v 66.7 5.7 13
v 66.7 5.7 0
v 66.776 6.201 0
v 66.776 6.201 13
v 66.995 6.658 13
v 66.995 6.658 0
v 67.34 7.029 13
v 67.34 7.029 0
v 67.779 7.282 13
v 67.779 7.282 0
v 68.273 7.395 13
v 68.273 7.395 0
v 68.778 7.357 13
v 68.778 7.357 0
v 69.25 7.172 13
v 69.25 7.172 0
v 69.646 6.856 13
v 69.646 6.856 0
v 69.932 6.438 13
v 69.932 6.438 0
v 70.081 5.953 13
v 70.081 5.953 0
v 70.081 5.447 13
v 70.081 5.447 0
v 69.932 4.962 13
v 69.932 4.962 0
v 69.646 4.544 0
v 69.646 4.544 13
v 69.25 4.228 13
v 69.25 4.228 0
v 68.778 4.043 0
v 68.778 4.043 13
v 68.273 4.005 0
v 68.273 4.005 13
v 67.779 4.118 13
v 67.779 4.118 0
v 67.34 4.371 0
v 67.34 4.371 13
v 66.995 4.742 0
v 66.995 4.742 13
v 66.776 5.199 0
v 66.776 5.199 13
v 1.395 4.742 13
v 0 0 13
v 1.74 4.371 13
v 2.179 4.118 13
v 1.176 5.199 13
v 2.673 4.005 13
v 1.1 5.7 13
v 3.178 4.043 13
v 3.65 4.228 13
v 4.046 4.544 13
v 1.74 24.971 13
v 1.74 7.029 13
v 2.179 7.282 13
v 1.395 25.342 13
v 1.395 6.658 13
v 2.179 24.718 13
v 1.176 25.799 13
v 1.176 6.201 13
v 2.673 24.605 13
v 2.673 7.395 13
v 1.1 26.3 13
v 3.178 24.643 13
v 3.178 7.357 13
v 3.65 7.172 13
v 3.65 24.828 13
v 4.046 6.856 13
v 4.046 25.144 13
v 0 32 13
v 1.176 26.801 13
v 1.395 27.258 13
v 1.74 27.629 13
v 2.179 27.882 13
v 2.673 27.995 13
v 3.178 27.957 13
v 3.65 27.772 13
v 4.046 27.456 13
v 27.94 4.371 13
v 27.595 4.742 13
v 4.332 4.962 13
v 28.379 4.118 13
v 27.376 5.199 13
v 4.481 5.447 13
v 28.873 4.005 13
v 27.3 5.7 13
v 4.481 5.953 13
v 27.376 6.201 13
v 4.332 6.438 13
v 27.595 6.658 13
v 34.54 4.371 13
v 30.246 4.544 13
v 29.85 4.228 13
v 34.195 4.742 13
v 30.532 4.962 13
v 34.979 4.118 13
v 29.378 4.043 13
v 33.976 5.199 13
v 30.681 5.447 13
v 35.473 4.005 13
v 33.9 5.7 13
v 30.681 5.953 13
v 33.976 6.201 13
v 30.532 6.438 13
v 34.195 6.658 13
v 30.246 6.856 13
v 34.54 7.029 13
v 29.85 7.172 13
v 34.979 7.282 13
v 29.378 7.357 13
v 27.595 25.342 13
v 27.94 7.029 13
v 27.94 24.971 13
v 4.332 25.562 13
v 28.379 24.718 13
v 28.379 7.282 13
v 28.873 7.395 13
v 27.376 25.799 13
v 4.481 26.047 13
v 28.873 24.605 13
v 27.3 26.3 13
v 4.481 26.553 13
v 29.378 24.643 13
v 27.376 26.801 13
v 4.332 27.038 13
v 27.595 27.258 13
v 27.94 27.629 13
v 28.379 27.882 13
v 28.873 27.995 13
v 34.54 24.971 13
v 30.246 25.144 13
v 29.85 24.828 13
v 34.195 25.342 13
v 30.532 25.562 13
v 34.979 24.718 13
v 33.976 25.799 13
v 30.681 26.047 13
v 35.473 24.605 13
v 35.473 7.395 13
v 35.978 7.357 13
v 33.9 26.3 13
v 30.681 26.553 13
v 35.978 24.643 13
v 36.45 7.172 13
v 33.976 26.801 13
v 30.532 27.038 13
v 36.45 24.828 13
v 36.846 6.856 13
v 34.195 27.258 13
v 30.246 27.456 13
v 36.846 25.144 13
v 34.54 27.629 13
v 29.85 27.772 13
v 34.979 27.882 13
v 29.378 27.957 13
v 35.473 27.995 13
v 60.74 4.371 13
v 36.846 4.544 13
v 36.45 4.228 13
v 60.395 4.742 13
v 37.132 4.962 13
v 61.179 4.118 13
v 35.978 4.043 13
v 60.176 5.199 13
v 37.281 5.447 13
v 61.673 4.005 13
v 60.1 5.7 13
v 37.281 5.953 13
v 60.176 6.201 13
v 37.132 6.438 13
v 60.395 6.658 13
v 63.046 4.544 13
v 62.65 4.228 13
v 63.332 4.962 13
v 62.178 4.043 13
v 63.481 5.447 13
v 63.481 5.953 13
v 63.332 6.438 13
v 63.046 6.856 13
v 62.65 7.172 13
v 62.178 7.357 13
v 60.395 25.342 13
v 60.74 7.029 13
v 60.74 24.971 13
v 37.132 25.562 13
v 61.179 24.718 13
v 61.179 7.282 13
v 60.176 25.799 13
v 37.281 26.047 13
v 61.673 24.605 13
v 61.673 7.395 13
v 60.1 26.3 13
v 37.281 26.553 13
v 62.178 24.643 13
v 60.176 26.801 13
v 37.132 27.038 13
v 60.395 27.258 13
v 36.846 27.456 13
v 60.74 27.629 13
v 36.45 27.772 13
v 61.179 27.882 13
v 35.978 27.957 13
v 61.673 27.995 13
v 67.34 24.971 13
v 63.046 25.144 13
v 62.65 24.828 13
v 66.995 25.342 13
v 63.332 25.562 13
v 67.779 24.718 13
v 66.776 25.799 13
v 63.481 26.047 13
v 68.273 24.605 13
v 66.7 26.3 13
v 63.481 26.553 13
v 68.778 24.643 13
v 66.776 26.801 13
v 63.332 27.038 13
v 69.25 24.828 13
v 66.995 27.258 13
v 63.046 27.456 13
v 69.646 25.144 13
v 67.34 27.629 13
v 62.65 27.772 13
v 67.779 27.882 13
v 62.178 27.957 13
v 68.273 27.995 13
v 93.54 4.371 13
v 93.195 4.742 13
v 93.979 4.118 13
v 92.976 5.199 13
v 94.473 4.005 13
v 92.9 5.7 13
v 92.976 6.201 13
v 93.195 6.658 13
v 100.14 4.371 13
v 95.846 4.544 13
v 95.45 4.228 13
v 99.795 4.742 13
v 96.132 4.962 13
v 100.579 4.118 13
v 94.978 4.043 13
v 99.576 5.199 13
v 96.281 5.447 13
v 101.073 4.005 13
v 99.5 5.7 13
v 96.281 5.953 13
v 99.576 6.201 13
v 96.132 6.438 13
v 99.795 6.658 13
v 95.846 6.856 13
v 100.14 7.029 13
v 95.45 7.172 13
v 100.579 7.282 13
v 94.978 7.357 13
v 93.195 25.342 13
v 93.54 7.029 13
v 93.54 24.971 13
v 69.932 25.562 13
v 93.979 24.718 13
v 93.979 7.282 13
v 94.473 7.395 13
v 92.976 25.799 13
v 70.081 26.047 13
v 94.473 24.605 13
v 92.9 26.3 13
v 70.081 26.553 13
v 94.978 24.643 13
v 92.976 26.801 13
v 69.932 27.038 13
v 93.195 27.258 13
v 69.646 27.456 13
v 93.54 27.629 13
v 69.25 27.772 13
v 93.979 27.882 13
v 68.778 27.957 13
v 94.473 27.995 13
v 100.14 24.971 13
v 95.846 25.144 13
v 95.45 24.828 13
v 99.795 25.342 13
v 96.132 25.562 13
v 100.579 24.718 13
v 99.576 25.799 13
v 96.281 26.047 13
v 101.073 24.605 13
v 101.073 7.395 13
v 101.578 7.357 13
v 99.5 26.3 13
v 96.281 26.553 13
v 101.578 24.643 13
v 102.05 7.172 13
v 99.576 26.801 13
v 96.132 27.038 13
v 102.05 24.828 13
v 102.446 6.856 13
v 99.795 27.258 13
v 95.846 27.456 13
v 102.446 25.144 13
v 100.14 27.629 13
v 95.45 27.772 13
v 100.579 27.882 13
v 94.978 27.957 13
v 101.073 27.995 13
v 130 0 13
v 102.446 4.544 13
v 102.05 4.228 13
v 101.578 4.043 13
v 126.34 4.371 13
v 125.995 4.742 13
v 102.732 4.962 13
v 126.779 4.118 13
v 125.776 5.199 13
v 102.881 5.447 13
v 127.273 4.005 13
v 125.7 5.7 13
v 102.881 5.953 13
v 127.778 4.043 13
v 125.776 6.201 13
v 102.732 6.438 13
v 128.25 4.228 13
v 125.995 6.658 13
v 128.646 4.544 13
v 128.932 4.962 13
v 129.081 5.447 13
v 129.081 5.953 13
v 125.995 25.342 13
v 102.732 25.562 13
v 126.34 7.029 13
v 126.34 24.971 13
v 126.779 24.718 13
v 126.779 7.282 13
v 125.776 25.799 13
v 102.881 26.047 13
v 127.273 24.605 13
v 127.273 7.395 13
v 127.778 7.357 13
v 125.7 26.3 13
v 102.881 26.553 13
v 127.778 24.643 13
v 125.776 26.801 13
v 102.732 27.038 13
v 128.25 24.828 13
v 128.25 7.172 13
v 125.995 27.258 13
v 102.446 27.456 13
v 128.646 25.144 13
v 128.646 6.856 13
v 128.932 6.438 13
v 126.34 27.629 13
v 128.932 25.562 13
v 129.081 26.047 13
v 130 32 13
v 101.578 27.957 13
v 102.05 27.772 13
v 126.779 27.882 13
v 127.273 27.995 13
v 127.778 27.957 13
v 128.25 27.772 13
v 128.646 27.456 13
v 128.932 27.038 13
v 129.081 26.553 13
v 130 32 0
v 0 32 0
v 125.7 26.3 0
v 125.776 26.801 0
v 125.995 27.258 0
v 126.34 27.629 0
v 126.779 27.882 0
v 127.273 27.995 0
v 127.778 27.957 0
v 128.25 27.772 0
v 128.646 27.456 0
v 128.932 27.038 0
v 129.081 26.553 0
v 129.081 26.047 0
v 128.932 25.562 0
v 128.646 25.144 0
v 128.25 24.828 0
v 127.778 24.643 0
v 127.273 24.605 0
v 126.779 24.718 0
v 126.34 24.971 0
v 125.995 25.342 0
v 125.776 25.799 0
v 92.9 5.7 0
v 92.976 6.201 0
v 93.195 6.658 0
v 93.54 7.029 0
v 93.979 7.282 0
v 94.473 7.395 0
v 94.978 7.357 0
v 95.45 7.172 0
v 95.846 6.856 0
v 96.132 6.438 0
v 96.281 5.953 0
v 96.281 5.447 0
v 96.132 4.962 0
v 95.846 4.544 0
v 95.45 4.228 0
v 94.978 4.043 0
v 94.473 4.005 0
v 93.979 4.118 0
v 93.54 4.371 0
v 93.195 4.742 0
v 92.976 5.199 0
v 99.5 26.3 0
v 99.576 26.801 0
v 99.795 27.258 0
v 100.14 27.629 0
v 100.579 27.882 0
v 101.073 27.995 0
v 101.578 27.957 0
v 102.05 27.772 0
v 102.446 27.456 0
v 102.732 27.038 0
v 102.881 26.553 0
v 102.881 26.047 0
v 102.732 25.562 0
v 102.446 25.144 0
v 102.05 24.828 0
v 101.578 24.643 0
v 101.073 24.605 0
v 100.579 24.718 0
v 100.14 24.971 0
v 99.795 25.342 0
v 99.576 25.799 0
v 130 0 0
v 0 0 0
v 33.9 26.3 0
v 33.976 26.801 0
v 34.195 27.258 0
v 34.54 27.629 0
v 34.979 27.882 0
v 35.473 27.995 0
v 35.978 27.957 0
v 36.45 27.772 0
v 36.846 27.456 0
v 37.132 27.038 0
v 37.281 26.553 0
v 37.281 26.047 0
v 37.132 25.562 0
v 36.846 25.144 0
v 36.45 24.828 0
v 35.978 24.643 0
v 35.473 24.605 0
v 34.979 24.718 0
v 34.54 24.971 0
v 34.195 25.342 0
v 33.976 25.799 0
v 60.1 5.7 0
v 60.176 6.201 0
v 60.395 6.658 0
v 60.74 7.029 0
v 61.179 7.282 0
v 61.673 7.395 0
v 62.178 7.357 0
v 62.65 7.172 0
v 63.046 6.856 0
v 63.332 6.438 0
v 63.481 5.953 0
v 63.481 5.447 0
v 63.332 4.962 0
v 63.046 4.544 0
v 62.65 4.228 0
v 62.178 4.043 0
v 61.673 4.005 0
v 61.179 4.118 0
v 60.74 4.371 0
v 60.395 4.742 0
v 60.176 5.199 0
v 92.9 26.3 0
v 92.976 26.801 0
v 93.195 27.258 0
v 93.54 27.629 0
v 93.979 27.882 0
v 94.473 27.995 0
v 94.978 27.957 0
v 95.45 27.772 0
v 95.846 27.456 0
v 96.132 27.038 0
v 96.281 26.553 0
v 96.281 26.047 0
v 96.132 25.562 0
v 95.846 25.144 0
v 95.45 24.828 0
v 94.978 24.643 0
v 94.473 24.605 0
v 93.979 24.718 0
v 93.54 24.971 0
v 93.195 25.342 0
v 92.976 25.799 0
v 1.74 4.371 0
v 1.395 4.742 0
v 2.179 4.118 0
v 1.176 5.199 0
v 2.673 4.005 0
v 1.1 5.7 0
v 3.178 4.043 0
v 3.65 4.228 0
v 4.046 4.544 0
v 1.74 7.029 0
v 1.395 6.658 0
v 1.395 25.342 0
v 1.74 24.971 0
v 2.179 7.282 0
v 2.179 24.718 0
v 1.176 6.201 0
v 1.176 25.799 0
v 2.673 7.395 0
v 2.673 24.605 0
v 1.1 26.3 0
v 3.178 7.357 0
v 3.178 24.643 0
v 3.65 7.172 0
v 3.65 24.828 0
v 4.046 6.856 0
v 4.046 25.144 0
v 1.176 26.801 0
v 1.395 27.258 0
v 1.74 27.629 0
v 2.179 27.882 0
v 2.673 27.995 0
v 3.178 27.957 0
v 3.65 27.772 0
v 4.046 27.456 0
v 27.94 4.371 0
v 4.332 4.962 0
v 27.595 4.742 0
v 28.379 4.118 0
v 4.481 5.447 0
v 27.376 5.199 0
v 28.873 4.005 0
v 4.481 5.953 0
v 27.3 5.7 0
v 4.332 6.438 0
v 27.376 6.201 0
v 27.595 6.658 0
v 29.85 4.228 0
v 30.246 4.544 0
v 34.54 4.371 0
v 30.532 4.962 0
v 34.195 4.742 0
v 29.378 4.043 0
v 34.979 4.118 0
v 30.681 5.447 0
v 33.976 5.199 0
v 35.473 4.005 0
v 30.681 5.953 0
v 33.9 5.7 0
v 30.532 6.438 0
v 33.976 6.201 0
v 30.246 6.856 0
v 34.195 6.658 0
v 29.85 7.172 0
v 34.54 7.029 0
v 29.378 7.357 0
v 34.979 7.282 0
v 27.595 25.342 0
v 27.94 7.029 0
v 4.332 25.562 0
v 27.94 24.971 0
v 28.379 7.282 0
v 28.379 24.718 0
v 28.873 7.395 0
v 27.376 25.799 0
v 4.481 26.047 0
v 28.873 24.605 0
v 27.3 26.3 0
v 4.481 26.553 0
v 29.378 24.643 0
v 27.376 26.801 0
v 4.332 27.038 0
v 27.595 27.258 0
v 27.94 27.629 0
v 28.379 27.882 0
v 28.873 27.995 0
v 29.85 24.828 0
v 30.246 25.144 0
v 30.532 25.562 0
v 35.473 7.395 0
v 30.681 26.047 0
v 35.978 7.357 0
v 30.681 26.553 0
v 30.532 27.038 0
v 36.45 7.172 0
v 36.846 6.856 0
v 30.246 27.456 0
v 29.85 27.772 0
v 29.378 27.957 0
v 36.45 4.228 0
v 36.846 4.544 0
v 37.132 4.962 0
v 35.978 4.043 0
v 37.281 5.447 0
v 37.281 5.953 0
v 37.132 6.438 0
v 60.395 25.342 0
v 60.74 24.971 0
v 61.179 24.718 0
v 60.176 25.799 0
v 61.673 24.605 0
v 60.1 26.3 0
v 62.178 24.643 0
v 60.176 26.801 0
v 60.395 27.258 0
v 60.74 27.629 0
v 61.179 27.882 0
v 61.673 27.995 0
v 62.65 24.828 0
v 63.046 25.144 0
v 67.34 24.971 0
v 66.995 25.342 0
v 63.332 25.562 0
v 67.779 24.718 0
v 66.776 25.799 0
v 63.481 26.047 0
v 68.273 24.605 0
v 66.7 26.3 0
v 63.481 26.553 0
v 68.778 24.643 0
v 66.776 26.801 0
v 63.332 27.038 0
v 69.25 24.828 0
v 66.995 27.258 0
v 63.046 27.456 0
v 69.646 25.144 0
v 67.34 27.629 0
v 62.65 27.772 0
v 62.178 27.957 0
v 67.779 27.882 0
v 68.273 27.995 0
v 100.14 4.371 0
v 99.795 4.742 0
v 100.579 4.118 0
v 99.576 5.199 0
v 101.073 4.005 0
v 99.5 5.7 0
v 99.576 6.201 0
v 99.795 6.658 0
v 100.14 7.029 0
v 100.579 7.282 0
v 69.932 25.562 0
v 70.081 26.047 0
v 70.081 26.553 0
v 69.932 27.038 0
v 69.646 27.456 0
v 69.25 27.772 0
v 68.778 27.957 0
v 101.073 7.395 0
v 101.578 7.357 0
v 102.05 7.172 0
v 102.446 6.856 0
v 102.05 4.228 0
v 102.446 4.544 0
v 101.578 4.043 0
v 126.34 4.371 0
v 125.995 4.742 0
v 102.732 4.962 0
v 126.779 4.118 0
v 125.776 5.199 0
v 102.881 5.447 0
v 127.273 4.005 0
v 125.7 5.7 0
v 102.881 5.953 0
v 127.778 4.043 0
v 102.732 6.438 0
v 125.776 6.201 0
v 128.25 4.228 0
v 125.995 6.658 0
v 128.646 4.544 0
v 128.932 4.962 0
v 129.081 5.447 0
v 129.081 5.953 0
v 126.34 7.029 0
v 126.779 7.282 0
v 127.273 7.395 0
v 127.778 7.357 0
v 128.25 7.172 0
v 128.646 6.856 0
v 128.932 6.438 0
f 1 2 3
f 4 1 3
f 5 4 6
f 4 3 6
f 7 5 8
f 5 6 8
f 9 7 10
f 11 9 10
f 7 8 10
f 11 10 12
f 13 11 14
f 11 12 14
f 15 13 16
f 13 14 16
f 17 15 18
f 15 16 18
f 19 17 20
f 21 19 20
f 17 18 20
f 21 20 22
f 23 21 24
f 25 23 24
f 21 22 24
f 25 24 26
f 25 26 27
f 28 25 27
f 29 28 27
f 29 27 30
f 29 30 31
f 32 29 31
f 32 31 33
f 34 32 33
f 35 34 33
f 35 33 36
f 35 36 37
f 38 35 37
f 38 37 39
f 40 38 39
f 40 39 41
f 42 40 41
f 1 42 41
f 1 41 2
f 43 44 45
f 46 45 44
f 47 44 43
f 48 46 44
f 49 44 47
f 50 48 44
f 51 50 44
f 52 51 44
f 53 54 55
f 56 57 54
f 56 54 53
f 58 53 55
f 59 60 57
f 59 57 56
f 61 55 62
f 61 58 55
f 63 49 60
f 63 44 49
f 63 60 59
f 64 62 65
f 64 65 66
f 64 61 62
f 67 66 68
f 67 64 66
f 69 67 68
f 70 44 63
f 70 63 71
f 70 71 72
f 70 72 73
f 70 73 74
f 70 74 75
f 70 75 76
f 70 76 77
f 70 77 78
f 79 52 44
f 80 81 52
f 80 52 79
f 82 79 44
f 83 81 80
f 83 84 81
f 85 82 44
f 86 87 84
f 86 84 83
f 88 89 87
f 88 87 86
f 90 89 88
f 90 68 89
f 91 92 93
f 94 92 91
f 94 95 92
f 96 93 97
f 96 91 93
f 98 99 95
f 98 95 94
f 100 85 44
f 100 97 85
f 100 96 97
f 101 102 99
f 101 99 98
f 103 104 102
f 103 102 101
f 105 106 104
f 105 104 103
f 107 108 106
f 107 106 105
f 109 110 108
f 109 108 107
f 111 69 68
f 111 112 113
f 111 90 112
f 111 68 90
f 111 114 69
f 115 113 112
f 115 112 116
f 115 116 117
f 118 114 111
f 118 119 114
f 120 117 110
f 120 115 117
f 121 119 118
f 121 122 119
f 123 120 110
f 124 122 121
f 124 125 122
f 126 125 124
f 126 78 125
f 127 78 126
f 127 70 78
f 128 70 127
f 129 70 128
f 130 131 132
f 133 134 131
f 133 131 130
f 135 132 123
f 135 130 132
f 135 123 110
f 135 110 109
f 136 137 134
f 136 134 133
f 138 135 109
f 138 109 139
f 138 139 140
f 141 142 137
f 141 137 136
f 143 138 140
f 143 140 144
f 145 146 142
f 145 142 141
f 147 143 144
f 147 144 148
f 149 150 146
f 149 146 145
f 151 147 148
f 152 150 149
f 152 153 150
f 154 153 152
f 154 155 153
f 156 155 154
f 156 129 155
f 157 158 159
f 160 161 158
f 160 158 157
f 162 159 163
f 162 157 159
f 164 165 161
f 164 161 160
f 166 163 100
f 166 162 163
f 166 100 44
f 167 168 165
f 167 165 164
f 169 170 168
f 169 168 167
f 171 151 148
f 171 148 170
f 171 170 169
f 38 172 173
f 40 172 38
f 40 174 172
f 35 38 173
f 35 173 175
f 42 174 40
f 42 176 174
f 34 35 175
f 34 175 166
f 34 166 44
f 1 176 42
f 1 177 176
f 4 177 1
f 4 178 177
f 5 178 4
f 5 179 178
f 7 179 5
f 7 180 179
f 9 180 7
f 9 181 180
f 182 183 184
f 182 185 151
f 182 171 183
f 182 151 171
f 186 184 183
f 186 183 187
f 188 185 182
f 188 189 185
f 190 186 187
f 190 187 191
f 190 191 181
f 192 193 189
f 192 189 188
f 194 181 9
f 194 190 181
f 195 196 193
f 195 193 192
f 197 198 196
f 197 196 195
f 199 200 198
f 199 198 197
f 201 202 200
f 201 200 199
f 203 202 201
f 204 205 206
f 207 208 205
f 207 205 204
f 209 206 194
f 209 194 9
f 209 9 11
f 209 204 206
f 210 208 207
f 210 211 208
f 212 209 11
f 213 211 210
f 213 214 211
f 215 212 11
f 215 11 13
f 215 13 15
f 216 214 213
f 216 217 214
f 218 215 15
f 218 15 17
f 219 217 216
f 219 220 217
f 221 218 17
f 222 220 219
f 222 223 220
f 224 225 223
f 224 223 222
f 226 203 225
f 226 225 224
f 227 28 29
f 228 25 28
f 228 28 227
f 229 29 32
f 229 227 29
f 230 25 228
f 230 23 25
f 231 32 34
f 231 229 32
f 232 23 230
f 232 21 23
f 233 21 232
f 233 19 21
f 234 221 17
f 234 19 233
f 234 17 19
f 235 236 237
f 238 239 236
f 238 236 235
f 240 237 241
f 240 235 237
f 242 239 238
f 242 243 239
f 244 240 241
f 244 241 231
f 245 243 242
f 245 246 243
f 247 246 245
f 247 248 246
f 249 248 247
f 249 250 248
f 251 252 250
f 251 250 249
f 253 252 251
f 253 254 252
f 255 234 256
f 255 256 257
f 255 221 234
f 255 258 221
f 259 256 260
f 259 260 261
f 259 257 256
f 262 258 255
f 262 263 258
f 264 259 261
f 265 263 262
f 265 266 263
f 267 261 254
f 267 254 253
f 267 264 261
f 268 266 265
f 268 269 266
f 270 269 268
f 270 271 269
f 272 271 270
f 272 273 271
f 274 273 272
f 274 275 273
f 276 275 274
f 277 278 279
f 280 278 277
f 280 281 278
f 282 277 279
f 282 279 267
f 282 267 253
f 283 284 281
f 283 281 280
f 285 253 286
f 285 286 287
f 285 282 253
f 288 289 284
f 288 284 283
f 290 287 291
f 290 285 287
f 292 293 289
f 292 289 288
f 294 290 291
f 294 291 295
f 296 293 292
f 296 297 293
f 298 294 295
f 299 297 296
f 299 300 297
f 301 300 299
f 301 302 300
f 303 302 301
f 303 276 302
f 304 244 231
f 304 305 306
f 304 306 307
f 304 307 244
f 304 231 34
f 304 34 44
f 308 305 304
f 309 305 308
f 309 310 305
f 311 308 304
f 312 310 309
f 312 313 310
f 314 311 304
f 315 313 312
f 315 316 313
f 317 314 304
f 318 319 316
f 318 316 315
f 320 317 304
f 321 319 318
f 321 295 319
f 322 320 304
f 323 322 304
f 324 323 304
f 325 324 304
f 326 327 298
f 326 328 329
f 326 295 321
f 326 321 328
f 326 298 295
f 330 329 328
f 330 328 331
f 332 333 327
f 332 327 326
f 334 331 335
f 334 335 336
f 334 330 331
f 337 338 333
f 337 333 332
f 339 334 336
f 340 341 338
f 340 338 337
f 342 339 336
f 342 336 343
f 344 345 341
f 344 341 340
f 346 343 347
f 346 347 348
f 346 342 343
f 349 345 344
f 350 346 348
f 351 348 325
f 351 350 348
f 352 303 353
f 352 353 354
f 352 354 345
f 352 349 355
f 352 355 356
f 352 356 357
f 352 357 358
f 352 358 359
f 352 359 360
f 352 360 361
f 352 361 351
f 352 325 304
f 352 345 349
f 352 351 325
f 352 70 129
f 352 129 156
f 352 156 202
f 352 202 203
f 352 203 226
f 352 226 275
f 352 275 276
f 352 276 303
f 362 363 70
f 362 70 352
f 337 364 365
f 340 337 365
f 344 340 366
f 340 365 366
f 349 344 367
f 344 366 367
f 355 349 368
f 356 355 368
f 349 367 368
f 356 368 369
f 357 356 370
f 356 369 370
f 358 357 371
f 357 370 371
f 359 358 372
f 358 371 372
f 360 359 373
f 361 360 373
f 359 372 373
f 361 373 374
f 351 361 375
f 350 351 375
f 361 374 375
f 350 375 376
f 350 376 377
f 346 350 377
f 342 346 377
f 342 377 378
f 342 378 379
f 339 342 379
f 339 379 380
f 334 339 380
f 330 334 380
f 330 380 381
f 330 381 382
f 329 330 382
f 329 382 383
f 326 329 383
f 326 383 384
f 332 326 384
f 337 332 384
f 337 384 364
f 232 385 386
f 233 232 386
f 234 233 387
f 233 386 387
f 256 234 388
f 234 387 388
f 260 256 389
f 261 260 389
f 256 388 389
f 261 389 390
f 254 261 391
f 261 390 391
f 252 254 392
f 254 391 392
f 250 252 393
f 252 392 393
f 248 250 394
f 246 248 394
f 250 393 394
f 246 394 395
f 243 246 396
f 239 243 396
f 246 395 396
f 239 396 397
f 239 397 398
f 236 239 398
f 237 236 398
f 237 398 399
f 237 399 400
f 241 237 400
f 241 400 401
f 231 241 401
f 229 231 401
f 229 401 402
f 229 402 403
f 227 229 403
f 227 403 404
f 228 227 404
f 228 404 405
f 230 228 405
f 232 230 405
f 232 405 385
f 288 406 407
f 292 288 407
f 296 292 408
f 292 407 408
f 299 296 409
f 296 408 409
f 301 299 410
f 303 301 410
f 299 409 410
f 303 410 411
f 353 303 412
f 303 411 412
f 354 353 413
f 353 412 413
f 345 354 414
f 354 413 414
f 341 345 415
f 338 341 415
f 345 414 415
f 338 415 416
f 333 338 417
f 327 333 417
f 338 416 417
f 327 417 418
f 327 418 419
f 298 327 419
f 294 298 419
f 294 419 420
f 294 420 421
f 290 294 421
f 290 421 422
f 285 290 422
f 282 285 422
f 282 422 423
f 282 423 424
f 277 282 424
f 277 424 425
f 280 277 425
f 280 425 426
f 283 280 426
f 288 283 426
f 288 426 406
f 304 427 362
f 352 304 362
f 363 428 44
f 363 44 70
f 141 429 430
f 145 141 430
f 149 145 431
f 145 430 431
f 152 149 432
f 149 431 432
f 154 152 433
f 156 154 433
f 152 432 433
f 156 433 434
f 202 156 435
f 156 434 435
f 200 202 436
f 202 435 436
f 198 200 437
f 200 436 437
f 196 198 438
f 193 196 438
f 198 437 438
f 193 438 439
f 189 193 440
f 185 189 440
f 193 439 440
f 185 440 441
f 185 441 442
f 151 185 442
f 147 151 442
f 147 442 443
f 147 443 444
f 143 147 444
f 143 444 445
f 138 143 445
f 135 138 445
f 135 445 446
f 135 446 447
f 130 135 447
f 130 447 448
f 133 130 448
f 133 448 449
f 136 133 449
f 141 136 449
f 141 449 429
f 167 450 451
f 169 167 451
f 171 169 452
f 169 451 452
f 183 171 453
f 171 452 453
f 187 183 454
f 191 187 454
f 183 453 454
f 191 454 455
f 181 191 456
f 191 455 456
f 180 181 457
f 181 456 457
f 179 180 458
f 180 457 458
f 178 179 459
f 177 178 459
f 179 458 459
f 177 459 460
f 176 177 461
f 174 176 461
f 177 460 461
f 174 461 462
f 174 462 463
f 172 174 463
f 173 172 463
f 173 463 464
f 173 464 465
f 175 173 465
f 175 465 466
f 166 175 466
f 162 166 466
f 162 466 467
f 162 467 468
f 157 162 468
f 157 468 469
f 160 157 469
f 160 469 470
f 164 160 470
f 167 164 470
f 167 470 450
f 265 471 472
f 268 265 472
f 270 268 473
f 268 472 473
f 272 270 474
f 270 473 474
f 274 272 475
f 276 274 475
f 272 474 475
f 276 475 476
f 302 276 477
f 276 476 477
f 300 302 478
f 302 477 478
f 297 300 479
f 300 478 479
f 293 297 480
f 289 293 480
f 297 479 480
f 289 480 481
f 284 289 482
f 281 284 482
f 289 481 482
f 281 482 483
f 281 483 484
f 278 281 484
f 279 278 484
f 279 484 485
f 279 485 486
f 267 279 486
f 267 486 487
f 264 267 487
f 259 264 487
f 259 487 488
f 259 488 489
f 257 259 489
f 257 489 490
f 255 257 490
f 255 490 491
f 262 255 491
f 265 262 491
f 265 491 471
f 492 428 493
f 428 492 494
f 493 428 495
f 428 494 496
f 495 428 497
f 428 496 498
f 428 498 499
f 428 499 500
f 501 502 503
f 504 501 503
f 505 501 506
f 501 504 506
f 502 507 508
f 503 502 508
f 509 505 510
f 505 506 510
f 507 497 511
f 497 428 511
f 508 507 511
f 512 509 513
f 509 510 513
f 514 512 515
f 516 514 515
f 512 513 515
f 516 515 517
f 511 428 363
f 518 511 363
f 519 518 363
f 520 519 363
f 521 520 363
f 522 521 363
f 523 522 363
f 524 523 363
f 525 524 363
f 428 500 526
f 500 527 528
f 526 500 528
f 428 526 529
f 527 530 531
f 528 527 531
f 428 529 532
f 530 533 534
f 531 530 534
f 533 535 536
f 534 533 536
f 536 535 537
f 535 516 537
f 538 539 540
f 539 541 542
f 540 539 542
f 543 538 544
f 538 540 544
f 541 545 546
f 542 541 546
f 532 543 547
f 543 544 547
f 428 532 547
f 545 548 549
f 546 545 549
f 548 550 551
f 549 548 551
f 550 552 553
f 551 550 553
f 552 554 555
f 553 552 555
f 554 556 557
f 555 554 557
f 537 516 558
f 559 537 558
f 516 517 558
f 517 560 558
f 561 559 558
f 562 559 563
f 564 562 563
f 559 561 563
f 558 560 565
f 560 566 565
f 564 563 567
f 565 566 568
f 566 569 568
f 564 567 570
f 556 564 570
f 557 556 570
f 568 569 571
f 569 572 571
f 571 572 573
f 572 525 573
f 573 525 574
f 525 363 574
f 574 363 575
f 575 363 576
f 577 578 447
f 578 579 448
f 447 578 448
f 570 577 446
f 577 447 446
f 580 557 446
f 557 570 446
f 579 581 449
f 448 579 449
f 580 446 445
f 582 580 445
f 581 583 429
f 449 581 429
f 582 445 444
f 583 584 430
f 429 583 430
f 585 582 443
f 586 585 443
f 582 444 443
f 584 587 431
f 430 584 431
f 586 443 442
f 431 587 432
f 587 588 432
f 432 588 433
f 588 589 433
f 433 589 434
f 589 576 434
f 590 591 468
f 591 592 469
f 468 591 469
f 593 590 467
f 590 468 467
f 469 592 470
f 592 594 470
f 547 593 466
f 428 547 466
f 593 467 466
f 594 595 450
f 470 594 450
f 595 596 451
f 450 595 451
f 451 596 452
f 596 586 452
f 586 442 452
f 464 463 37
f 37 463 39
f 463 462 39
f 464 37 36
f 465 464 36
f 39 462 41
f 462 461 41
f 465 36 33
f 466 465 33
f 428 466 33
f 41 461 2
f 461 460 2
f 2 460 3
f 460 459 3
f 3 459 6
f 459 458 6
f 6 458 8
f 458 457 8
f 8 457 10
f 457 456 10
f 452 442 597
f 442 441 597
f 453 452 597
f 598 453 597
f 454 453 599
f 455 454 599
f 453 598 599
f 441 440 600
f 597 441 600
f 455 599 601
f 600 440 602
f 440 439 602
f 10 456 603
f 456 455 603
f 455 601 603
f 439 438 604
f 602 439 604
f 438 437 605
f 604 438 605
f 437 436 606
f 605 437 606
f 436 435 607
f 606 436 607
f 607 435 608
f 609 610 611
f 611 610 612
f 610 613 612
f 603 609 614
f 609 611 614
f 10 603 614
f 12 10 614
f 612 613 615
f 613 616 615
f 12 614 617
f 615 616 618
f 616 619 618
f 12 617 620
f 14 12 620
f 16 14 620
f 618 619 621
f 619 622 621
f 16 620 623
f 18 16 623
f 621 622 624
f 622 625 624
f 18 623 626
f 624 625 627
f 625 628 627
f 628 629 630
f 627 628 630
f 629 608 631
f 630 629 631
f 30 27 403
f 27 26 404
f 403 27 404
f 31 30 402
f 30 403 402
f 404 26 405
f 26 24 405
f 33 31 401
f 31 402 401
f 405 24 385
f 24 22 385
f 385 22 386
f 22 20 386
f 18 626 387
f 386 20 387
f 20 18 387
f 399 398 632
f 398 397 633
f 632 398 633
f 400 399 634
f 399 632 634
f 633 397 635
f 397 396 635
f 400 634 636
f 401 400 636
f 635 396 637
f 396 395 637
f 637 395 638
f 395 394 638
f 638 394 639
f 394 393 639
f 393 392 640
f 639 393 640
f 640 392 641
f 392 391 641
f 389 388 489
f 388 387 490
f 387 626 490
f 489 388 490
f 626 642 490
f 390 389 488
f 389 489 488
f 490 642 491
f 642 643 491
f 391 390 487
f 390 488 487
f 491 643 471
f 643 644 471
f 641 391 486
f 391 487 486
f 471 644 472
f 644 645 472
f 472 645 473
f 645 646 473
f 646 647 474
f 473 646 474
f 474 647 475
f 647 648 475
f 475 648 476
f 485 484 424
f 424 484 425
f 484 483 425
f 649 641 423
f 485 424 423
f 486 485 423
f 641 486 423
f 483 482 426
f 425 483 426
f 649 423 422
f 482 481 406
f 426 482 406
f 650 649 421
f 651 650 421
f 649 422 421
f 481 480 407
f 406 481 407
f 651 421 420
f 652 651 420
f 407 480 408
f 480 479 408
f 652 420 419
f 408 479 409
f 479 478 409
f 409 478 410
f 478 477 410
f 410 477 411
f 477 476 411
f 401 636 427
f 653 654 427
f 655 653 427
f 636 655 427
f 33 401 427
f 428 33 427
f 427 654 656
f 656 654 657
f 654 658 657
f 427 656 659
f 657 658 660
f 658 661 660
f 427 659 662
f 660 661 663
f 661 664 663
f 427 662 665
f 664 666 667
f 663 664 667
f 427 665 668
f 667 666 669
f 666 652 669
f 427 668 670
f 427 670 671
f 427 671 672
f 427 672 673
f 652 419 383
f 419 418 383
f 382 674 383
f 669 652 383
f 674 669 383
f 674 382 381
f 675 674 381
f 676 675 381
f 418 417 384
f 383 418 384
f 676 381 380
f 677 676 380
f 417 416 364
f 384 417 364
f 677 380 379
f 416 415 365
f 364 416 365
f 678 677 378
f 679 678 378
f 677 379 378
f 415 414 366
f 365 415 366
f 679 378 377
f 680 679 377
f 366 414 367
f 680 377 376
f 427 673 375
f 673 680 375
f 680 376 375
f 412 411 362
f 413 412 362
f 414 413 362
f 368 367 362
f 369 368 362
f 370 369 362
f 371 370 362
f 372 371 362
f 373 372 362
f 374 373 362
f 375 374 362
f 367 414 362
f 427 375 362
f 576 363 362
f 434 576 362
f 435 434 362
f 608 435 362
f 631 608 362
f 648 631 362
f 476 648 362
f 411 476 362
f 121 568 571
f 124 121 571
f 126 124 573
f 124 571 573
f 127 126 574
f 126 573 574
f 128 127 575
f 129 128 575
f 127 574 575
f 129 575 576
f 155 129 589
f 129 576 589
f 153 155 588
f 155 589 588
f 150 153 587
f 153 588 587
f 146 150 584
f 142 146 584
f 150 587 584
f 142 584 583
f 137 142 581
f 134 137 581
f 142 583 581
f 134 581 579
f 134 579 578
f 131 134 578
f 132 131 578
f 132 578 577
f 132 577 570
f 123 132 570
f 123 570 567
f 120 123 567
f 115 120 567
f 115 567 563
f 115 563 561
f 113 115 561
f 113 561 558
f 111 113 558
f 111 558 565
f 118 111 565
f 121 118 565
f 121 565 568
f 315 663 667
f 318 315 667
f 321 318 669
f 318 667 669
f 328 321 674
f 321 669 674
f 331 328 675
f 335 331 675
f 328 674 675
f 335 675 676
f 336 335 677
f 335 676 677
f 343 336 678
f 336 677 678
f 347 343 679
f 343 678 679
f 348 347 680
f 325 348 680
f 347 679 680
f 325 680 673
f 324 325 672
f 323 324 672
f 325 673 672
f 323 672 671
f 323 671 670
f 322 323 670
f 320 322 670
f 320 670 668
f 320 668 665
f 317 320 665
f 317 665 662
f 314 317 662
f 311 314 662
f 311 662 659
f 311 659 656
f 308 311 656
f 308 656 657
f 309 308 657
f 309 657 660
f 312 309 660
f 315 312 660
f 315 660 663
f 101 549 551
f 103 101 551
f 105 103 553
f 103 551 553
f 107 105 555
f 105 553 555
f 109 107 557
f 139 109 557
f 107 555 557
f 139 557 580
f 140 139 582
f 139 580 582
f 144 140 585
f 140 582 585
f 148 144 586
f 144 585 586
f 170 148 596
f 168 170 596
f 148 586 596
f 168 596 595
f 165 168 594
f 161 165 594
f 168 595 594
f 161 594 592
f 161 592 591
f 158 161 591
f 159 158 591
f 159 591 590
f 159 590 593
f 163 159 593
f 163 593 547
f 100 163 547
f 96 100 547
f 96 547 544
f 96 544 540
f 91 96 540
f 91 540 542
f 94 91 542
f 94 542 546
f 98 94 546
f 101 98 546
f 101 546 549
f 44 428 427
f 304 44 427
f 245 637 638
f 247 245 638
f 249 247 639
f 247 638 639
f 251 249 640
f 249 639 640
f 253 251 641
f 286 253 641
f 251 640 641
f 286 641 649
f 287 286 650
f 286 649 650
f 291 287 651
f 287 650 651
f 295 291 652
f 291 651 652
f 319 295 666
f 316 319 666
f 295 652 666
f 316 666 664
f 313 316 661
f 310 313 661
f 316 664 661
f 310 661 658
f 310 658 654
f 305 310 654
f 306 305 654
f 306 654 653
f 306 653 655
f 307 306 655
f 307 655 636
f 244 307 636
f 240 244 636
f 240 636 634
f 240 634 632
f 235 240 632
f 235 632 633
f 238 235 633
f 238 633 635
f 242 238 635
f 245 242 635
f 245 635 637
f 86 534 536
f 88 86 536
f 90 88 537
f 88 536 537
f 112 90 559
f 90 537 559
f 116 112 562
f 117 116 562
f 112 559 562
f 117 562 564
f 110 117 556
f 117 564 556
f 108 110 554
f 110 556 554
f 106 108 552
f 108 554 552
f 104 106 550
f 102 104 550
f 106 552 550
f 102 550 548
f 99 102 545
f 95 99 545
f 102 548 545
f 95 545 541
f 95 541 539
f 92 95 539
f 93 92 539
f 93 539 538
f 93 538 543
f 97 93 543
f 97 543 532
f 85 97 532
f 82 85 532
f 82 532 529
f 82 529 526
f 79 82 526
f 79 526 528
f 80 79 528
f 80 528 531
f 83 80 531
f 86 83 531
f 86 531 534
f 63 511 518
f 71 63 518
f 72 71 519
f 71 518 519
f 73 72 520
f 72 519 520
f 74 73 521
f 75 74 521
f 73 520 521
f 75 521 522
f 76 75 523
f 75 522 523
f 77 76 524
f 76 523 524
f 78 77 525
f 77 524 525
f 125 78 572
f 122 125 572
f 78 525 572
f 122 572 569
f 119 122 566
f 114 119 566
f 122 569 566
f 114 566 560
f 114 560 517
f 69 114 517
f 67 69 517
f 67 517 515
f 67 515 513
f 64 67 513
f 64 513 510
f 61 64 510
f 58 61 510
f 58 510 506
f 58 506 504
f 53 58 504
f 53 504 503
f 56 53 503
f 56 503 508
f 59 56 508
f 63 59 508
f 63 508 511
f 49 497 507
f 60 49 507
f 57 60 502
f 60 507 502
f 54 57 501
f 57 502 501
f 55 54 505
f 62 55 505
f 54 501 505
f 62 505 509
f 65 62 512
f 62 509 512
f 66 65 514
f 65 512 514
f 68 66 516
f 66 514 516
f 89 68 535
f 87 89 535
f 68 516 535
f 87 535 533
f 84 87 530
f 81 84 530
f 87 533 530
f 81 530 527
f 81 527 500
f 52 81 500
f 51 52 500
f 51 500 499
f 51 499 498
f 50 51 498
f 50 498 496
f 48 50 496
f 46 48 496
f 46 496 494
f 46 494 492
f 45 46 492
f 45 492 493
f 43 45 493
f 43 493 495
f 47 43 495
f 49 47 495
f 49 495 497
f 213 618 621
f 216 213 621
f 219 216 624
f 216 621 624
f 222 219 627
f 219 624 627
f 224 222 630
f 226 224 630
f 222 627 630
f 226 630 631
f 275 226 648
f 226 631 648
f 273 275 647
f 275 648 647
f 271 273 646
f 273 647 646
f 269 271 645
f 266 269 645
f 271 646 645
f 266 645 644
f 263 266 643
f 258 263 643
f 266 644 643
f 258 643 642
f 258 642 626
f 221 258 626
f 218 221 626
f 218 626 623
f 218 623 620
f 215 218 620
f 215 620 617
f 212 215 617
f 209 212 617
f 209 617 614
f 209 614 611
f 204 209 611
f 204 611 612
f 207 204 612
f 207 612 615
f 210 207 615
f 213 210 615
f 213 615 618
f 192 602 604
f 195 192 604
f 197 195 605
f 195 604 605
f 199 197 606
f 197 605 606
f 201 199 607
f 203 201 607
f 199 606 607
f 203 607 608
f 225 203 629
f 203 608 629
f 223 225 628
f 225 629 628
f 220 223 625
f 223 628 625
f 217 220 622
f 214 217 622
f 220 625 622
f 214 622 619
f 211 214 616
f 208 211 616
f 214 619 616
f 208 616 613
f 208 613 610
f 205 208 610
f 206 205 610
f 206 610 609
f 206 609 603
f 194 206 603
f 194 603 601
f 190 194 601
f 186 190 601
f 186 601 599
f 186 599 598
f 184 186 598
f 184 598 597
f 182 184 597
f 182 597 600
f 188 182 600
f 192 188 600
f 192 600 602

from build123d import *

# Parameters (mm, degrees)
ESQUISSE1_W                = 130
ESQUISSE1_H                = 32
ESQUISSE1_R                = 1.5
BOSS_EXTRU_1_DEPTH         = 13
D_GAGEMENT_M31_D           = 3.4
D_GAGEMENT_M31_DEPTH       = 13
R_P_TITION_LIN_AIRE1_COUNT = 4
R_P_TITION_LIN_AIRE1_PITCH = 32.8


with BuildPart() as part:
    # Esquisse1 → Boss.-Extru.1 (new body)
    with BuildSketch(Plane.XY):
        with Locations((65, 16)):
            Rectangle(ESQUISSE1_W, ESQUISSE1_H)
        with Locations(Location((2.8, 26.3, 0), (0, 0, 180))):
            Circle(ESQUISSE1_R, mode=Mode.SUBTRACT)
        with Locations(Location((29, 26.3, 0), (0, 0, 180))):
            Circle(ESQUISSE1_R, mode=Mode.SUBTRACT)
        with Locations(Location((2.8, 5.7, 0), (0, 0, 180))):
            Circle(ESQUISSE1_R, mode=Mode.SUBTRACT)
        with Locations(Location((29, 5.7, 0), (0, 0, 180))):
            Circle(ESQUISSE1_R, mode=Mode.SUBTRACT)
    extrude(amount=BOSS_EXTRU_1_DEPTH)

    # Dégagement M31
    with Locations(Plane.XY.offset(13)):
        with Locations((2.8, 26.3), (29, 26.3), (2.8, 5.7), (29, 5.7)):
            d_gagement_m31 = Hole(D_GAGEMENT_M31_D / 2, depth=D_GAGEMENT_M31_DEPTH)

    # Répétition linéaire1: Dégagement M31 ×4
    with Locations(*[(i * R_P_TITION_LIN_AIRE1_PITCH, 0, 0) for i in range(1, R_P_TITION_LIN_AIRE1_COUNT)]):
        add(d_gagement_m31, mode=Mode.SUBTRACT)


solid = part.part
